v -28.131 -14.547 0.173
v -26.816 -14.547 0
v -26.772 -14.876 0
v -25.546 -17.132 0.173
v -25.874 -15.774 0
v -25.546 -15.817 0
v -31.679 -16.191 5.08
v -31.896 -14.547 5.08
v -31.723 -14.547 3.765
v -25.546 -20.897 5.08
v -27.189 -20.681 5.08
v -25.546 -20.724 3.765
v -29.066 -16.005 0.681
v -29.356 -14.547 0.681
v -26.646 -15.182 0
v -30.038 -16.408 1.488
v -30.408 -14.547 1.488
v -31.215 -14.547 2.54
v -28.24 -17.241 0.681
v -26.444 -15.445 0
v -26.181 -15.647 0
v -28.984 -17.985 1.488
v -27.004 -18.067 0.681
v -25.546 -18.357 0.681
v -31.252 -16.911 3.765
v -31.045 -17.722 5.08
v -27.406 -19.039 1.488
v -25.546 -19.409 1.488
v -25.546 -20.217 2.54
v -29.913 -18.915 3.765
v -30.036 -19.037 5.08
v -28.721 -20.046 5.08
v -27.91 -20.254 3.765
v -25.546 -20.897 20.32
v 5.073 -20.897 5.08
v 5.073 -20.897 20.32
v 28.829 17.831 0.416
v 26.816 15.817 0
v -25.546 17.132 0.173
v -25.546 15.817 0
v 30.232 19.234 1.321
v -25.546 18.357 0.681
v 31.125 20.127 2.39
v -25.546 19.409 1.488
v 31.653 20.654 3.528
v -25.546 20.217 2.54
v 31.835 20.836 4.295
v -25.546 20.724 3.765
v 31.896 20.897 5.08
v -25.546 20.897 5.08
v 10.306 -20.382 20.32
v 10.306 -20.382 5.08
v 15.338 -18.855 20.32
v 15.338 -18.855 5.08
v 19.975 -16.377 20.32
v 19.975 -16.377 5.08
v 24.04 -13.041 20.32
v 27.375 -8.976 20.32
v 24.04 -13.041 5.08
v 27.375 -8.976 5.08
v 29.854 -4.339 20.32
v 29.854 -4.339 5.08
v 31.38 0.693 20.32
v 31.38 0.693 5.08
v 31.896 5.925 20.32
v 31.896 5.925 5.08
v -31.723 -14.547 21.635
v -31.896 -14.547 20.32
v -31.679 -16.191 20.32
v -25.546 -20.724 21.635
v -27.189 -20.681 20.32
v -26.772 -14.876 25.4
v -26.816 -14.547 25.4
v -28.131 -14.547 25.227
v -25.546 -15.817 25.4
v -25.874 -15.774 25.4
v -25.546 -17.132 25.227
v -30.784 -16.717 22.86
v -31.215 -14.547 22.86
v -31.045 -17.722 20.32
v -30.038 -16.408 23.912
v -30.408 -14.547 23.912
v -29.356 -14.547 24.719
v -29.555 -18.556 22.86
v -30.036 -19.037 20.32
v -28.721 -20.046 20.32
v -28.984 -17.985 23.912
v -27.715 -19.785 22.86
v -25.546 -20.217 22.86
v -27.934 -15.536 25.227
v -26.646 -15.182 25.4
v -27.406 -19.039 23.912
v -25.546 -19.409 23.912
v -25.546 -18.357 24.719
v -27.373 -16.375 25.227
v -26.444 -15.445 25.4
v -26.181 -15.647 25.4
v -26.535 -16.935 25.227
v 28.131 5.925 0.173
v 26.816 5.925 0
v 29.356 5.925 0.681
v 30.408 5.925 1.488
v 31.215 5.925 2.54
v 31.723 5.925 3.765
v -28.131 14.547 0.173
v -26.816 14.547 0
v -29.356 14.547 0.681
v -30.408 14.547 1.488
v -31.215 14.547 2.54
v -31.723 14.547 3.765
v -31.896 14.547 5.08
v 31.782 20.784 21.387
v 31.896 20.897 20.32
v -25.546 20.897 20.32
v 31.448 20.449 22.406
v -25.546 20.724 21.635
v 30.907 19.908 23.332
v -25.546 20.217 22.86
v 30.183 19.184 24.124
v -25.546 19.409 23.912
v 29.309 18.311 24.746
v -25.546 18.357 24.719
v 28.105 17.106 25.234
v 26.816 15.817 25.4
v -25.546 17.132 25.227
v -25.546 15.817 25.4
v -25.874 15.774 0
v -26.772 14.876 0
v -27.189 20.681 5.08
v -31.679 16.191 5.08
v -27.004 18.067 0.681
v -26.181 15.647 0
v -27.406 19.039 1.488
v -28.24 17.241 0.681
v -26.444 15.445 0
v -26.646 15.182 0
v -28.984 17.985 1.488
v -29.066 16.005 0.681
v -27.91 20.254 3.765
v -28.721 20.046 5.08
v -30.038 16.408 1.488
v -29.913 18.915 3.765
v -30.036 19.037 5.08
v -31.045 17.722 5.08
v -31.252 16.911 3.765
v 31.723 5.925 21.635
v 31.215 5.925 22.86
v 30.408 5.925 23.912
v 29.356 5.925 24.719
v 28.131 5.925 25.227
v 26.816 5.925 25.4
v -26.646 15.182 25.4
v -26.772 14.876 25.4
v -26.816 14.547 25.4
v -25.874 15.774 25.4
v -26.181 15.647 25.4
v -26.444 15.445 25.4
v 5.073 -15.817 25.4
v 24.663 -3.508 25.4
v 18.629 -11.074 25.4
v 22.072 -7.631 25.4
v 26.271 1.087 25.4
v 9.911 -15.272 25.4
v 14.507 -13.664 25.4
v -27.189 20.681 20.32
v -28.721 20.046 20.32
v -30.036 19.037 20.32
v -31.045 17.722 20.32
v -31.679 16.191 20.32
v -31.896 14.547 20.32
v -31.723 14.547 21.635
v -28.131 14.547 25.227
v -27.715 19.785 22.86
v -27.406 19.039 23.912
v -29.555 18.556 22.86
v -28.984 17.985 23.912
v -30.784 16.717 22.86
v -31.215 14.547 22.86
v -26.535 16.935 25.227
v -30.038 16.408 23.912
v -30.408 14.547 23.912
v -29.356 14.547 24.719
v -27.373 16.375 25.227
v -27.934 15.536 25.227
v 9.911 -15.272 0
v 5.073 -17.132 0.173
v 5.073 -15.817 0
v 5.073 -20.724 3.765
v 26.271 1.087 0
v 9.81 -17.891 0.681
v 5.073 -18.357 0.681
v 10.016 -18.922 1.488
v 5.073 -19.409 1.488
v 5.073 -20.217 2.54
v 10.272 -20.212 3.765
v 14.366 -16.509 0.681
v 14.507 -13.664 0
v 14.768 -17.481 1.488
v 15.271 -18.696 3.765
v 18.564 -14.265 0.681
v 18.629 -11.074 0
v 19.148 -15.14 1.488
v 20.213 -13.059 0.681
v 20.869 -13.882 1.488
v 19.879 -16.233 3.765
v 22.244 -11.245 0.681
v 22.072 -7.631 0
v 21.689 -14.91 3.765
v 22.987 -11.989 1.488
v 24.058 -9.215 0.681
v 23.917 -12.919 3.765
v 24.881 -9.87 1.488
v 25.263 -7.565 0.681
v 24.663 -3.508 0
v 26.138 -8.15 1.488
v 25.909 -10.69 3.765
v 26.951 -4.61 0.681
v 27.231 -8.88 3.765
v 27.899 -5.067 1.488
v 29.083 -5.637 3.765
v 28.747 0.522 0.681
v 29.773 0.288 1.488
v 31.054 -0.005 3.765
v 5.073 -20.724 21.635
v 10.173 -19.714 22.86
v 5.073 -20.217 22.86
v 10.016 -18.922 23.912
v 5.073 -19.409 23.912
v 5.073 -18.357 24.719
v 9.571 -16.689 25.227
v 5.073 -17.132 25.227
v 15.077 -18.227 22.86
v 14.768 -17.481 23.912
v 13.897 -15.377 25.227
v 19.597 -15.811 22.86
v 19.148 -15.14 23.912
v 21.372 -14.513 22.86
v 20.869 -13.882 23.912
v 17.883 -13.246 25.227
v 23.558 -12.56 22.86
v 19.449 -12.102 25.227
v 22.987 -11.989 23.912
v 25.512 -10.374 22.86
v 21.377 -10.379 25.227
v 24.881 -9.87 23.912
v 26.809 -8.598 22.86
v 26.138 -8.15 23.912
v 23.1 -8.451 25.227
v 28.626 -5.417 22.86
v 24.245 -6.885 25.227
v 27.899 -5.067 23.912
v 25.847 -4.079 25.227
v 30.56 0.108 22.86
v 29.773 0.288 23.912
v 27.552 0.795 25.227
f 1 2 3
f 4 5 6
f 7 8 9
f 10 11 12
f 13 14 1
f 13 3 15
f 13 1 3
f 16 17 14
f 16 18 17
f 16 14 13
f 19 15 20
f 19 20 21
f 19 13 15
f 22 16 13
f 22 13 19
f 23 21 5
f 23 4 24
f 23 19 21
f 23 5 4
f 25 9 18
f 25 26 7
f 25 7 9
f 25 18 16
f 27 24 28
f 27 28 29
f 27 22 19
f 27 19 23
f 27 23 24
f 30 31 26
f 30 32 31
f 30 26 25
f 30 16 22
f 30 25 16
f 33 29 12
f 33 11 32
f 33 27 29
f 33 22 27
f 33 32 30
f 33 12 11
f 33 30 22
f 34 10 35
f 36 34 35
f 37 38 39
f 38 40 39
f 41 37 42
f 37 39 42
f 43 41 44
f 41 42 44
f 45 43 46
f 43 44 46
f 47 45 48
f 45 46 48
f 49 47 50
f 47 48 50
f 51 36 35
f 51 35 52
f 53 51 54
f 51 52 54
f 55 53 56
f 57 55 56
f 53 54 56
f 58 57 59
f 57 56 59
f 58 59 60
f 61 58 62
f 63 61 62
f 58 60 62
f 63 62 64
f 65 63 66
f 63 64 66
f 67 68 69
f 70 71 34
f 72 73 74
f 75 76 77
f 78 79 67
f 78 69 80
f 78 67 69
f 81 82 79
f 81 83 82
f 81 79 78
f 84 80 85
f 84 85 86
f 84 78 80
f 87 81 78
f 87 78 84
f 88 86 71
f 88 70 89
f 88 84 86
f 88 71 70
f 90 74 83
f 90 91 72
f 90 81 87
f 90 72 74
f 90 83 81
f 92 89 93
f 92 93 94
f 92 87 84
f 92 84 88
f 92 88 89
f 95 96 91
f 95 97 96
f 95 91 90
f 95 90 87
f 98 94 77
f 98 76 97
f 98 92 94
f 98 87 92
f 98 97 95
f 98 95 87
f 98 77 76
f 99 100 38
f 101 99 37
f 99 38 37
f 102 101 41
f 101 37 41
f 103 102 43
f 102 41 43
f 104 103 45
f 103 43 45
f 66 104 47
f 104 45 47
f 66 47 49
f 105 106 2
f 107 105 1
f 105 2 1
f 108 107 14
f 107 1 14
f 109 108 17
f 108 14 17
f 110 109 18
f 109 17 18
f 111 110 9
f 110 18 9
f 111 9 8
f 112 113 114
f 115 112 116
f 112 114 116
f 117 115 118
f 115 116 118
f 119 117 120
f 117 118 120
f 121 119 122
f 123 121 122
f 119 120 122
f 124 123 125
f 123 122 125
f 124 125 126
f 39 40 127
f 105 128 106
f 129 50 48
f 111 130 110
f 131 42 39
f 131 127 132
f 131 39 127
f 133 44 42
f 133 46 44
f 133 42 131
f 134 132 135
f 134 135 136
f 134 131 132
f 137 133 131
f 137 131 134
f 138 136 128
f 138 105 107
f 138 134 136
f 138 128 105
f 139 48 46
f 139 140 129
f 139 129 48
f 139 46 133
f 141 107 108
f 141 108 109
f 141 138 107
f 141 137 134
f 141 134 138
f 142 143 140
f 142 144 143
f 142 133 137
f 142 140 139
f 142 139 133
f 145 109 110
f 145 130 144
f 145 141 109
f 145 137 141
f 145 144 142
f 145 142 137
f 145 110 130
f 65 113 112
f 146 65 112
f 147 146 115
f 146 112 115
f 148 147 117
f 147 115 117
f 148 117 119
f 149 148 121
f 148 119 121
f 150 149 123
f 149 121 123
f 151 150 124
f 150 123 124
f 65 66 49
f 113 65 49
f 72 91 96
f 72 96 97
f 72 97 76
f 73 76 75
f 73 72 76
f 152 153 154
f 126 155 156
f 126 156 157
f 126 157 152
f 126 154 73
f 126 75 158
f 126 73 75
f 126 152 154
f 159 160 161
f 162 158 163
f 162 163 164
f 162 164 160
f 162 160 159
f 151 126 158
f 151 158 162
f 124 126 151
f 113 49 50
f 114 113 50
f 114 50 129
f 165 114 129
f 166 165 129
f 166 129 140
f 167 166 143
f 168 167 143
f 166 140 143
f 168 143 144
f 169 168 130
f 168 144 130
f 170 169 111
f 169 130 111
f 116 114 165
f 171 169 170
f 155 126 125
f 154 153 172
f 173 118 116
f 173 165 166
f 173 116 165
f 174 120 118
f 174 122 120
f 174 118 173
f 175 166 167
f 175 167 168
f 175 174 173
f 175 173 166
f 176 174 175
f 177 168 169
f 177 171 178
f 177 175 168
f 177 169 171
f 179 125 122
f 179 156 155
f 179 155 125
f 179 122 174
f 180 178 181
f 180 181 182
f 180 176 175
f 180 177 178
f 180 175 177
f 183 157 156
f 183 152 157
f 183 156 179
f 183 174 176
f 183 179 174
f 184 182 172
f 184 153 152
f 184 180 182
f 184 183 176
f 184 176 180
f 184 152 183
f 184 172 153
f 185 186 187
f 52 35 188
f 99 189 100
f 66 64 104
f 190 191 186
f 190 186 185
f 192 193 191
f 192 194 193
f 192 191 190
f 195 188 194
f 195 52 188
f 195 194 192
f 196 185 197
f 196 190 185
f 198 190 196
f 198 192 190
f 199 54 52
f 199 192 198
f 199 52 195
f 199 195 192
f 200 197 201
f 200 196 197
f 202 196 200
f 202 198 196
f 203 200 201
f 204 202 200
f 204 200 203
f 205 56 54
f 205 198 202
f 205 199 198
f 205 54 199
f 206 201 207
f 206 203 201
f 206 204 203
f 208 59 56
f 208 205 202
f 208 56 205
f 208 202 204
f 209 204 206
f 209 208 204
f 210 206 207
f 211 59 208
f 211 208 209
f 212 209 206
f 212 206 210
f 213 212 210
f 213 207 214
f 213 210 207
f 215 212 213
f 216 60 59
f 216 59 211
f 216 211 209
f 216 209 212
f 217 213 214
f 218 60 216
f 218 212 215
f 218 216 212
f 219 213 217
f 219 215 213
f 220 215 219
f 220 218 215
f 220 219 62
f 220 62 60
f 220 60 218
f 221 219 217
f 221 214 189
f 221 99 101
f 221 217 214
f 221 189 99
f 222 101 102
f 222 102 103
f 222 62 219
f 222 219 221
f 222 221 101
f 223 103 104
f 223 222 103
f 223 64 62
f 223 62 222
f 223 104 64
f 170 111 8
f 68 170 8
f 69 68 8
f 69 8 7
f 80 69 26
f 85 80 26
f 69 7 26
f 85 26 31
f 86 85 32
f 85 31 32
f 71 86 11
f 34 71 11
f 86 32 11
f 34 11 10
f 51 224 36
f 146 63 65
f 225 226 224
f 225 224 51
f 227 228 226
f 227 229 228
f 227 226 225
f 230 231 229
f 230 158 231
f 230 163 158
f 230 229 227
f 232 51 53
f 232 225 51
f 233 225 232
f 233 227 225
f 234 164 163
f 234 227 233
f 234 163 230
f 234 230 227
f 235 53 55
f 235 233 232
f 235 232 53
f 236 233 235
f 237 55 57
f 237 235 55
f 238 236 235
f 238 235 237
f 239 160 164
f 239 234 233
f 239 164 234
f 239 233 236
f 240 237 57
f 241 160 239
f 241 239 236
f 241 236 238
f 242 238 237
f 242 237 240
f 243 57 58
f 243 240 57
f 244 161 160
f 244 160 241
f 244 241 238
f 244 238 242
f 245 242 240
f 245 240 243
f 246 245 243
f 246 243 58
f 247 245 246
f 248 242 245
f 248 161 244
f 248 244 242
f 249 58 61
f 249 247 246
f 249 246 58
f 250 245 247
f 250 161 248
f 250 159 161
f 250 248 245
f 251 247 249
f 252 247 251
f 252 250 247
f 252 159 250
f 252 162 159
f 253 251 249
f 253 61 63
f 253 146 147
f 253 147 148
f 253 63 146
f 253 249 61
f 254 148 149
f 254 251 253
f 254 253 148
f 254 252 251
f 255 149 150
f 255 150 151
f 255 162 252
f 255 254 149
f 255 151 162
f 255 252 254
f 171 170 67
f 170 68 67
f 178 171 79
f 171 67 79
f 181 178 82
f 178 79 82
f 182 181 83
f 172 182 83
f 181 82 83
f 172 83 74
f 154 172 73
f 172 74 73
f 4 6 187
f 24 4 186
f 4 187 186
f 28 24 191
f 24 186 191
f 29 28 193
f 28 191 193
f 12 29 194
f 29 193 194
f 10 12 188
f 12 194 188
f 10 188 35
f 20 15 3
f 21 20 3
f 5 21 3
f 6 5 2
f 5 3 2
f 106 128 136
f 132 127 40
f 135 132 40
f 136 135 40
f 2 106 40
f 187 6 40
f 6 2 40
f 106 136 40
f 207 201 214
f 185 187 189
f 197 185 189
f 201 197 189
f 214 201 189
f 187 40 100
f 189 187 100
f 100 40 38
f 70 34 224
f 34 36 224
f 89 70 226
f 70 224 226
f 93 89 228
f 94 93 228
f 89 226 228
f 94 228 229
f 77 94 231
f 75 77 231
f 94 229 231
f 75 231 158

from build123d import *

# Parameters (mm, degrees)
F1_DEPTH = 25.4
F2_R     = 5.08
F3_R     = 5.08


with BuildPart() as f1:
    # F0 (on Top) → F1 (new body)
    with BuildSketch(Plane.XY):
        with BuildLine():
            Line((31.895727, 5.925444), (31.895727, 20.89718))
            Line((31.895727, 20.89718), (-25.545727, 20.89718))
            ThreePointArc((-25.545727, 20.89718), (-30.035855, 19.037308), (-31.895727, 14.54718))
            Line((-31.895727, 14.54718), (-31.895727, -14.54718))
            ThreePointArc((-31.895727, -14.54718), (-30.035855, -19.037308), (-25.545727, -20.89718))
            Line((-25.545727, -20.89718), (5.073103, -20.89718))
            ThreePointArc((5.073103, -20.89718), (24.039562, -13.041015), (31.895727, 5.925444))
        make_face()
    extrude(amount=F1_DEPTH)

    # F2
    f2_edges = [f1.edges().sort_by_distance(p)[0] for p in [
        (24.039562, -13.041015, 25.4),
        (31.895727, 13.411312, 25.4),
        (3.175, 20.89718, 25.4),
        (-30.035855, 19.037308, 25.4),
        (-31.895727, 0, 25.4),
        (-10.236312, -20.89718, 25.4),
        (-30.035855, -19.037308, 25.4),
    ]]
    fillet(f2_edges, radius=F2_R)

    # F3
    f3_edges = [f1.edges().sort_by_distance(p)[0] for p in [
        (3.175, 20.89718, 0),
        (31.895727, 13.411312, 0),
        (24.039562, -13.041015, 0),
        (-10.236312, -20.89718, 0),
        (-30.035855, -19.037308, 0),
        (-31.895727, 0, 0),
        (-30.035855, 19.037308, 0),
    ]]
    fillet(f3_edges, radius=F3_R)


solid = f1.part
